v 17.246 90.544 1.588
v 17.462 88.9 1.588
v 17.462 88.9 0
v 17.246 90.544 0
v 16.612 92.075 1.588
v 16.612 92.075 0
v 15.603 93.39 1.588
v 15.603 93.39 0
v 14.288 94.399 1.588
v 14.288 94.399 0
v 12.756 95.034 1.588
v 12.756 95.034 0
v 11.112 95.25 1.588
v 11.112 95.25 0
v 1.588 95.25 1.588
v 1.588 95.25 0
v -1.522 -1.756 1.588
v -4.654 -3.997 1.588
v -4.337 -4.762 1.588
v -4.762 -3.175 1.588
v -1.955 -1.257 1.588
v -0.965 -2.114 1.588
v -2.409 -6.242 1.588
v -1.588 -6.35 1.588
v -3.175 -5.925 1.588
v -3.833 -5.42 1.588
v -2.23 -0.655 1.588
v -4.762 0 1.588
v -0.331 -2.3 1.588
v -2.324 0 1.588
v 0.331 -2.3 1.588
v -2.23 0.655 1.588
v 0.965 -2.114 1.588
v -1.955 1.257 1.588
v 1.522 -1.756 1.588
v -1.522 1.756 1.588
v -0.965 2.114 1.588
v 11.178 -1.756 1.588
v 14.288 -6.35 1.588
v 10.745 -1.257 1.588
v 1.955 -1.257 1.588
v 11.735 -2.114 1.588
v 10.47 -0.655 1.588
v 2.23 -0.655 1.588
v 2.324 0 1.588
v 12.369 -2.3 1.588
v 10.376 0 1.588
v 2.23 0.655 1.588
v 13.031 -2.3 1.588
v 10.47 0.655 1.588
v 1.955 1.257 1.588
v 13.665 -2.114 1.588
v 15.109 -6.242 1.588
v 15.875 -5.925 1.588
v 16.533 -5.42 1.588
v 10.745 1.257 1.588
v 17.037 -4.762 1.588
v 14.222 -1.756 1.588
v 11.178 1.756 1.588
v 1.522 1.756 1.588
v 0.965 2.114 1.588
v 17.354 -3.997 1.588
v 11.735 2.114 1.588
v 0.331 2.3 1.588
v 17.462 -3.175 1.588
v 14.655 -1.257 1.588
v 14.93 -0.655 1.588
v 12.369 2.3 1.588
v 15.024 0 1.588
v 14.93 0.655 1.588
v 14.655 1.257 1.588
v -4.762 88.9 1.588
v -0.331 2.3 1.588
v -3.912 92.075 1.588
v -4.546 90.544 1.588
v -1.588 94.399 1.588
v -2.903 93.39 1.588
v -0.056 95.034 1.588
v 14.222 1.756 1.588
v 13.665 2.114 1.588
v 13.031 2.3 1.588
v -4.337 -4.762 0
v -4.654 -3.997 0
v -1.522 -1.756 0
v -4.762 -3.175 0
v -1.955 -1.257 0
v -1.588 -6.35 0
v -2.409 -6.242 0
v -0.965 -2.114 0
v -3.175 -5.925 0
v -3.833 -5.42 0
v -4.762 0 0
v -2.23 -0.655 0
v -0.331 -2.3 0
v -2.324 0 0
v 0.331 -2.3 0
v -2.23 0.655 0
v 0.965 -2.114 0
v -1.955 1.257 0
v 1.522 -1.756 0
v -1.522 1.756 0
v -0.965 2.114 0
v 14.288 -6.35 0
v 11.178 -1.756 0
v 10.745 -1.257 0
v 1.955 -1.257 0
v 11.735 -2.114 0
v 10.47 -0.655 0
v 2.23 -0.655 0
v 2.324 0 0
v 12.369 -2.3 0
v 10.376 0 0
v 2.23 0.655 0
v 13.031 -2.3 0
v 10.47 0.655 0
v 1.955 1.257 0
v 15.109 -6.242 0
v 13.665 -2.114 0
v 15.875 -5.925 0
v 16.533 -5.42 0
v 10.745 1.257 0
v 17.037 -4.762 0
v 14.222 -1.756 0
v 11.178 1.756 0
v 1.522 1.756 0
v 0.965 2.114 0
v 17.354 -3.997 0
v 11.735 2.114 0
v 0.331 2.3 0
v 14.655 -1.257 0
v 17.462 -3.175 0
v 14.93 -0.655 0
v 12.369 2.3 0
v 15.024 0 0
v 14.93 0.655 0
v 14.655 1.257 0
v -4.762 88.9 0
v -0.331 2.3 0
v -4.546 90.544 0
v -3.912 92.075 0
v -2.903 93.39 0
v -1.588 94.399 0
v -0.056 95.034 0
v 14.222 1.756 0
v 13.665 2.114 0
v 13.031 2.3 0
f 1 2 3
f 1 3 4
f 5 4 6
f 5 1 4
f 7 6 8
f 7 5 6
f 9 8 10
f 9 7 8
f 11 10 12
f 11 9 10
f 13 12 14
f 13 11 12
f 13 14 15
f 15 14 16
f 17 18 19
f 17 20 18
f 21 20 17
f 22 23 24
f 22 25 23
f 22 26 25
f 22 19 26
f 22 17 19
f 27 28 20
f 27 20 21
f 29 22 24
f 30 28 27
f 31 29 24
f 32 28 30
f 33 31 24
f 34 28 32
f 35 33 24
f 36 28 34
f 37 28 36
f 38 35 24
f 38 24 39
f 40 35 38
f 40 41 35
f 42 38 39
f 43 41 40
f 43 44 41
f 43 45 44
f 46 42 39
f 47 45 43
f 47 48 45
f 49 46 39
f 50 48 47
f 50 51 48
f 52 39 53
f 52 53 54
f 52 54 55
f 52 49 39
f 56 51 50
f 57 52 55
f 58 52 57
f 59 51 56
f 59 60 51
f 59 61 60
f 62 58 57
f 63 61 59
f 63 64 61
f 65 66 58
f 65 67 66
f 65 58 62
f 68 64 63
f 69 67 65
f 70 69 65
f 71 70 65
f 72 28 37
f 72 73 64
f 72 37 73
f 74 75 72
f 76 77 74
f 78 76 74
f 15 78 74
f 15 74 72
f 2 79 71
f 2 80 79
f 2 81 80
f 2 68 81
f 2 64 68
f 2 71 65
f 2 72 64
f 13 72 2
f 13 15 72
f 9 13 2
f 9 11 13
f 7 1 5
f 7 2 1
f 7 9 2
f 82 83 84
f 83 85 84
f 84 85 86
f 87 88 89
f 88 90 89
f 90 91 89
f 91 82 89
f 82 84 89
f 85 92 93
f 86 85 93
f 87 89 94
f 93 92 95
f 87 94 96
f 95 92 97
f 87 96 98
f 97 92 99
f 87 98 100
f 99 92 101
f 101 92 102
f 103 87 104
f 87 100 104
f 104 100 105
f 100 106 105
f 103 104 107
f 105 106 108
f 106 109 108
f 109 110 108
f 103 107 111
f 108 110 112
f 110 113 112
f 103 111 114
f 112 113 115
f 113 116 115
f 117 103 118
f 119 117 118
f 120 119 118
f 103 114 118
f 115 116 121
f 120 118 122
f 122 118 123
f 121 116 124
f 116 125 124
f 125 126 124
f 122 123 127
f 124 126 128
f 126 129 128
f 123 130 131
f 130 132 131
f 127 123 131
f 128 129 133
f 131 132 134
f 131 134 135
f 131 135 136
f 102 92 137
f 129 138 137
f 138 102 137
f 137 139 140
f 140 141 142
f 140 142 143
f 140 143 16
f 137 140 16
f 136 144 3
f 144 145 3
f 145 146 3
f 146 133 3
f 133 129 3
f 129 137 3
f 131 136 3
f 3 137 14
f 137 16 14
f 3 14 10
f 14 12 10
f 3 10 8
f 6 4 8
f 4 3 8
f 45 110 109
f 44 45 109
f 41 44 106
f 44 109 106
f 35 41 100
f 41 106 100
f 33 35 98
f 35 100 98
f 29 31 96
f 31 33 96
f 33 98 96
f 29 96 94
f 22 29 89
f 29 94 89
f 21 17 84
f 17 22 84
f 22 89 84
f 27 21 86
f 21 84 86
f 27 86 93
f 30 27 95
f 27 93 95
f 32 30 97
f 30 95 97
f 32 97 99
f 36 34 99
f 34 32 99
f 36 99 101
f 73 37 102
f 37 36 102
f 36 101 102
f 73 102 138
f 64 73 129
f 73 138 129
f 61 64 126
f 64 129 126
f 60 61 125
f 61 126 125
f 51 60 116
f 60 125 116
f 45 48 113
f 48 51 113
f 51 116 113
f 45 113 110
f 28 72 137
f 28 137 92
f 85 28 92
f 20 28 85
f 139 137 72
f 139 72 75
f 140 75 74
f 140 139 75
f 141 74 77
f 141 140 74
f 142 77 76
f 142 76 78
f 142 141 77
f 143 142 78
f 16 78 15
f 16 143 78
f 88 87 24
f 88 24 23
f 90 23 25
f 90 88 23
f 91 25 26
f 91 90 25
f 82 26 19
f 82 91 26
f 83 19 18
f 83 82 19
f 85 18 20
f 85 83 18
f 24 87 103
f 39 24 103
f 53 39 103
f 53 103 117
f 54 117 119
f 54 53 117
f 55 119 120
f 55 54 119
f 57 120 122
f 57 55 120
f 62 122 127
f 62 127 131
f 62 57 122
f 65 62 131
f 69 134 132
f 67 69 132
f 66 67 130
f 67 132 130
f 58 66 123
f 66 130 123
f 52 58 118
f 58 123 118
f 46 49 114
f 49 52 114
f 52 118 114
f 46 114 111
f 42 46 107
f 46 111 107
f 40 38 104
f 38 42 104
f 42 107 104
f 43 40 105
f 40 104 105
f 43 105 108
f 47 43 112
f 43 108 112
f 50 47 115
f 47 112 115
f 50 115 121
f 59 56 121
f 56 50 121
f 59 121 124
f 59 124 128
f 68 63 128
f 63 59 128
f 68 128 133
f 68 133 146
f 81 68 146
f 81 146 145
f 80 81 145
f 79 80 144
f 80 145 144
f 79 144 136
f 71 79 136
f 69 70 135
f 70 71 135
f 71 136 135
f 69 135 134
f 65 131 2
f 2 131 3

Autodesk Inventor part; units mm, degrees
ref_plane "YZ Plane" through (0, 0, 0) normal (1, 0, 0) x (0, 1, 0)
ref_plane "XZ Plane" through (0, 0, 0) normal (0, 1, 0) x (-1, 0, 0)
ref_plane "XY Plane" through (0, 0, 0) normal (0, 0, 1) x (1, 0, 0)
sketch "Sketch1" plane through (0, 0, 0) normal (0, 0, 1) x (1, 0, 0)
  circle A0 centre (0, 0) radius 2.3241
  line L0 (0, 0) -> (12.7, 0)
  line L1 (0, 0) -> (-12.7, 0)
  circle A1 centre (-12.7, 0) radius 2.3241
  circle A2 centre (12.7, 0) radius 2.3241
  line L2 (-19.05, -6.35) -> (19.05, -6.35)
  line L3 (19.05, -6.35) -> (19.05, 6.35)
  line L4 (19.05, 6.35) -> (-19.05, 6.35)
  line L5 (-19.05, 6.35) -> (-19.05, -6.35)
  line L6 (-19.05, -6.35) -> (19.05, 6.35) construction
  line L7 (19.05, -6.35) -> (-19.05, 6.35) construction
  line L8 (-19.05, 6.35) -> (19.05, 6.35)
  line L9 (19.05, 6.35) -> (19.05, 95.25)
  line L10 (19.05, 95.25) -> (-19.05, 95.25)
  line L11 (-19.05, 95.25) -> (-19.05, 6.35)
  line L12 (-19.05, -6.35) -> (-17.4625, -6.35)
  line L13 (19.05, -6.35) -> (17.4625, -6.35)
  line L14 (-17.4625, -6.35) -> (-17.4625, 95.25)
  line L15 (17.4625, -6.35) -> (17.4625, 95.25)
  dimension "d0" = 4.6482
  dimension "d1" = 12.7
  dimension "d2" = 12.7
  dimension "d3" = 4.6482
  dimension "d4" = 4.6482
  dimension "d5" = 38.1
  dimension "d6" = 12.7
  dimension "d7" = 88.9
  dimension "d8" = 38.1
  dimension "d11" = 1.5875
  dimension "d12" = 1.5875
extrude "Extrusion1" add sketch "Sketch1" along normal blind 1.5875
extrude "Extrusion2" cut sketch "Sketch1" along normal through all contours L5 L4 L14 L2 | L11 L10 L14 L4 | L15 L4 L3 L2 | L15 L10 L9 L4
fillet "Fillet1" radius 3.175 2 edges at (-17.4625, -6.35, 0.7937) (17.4625, -6.35, 0.7937)
fillet "Fillet2" radius 6.35 2 edges at (-17.4625, 95.25, 0.7937) (17.4625, 95.25, 0.7937)
sketch "Sketch2" plane through (0, 0, 1.5875) normal (0, 0, 1) x (1, 0, 0)
  arc A0 (17.4625, 88.9) -> (11.1125, 95.25) centre (11.1125, 88.9) ccw projected
  line L0 (11.1125, 95.25) -> (-11.1125, 95.25) projected
  arc A1 (-11.1125, 95.25) -> (-17.4625, 88.9) centre (-11.1125, 88.9) ccw projected
  line L1 (-17.4625, 88.9) -> (-17.4625, -3.175) projected
  arc A2 (-17.4625, -3.175) -> (-14.2875, -6.35) centre (-14.2875, -3.175) ccw projected
  line L2 (-14.2875, -6.35) -> (14.2875, -6.35) projected
  arc A3 (14.2875, -6.35) -> (17.4625, -3.175) centre (14.2875, -3.175) ccw projected
  line L3 (17.4625, -3.175) -> (17.4625, 88.9) projected
  circle A4 centre (12.7, 0) radius 2.3241 projected
  circle A5 centre (0, 0) radius 2.3241 projected
  circle A6 centre (-12.7, 0) radius 2.3241 projected
  line L4 (-17.4625, 10.0615) -> (-4.7625, 10.0615)
  line L5 (-4.7625, -6.35) -> (-31.8174, -6.35)
  line L6 (-31.8174, -6.35) -> (-31.8174, 101.6265)
  line L7 (-31.8174, 101.6265) -> (-4.7625, 101.6265)
  line L8 (-4.7625, 101.6265) -> (-4.7625, -6.35)
  point P0 (-4.7625, 95.25)
  dimension "d17" = 12.7
extrude "Extrusion3" cut sketch "Sketch2" against normal blind 25.4 contours L8 L4 L1 A1 L0 | L8 L2 A2 L1 L4
fillet "Fillet3" radius 3.175 1 edges at (-4.7625, -6.35, 0.7937)
fillet "Fillet4" radius 6.35 1 edges at (-4.7625, 95.25, 0.7937)
properties part number "American Flag Replacement"
